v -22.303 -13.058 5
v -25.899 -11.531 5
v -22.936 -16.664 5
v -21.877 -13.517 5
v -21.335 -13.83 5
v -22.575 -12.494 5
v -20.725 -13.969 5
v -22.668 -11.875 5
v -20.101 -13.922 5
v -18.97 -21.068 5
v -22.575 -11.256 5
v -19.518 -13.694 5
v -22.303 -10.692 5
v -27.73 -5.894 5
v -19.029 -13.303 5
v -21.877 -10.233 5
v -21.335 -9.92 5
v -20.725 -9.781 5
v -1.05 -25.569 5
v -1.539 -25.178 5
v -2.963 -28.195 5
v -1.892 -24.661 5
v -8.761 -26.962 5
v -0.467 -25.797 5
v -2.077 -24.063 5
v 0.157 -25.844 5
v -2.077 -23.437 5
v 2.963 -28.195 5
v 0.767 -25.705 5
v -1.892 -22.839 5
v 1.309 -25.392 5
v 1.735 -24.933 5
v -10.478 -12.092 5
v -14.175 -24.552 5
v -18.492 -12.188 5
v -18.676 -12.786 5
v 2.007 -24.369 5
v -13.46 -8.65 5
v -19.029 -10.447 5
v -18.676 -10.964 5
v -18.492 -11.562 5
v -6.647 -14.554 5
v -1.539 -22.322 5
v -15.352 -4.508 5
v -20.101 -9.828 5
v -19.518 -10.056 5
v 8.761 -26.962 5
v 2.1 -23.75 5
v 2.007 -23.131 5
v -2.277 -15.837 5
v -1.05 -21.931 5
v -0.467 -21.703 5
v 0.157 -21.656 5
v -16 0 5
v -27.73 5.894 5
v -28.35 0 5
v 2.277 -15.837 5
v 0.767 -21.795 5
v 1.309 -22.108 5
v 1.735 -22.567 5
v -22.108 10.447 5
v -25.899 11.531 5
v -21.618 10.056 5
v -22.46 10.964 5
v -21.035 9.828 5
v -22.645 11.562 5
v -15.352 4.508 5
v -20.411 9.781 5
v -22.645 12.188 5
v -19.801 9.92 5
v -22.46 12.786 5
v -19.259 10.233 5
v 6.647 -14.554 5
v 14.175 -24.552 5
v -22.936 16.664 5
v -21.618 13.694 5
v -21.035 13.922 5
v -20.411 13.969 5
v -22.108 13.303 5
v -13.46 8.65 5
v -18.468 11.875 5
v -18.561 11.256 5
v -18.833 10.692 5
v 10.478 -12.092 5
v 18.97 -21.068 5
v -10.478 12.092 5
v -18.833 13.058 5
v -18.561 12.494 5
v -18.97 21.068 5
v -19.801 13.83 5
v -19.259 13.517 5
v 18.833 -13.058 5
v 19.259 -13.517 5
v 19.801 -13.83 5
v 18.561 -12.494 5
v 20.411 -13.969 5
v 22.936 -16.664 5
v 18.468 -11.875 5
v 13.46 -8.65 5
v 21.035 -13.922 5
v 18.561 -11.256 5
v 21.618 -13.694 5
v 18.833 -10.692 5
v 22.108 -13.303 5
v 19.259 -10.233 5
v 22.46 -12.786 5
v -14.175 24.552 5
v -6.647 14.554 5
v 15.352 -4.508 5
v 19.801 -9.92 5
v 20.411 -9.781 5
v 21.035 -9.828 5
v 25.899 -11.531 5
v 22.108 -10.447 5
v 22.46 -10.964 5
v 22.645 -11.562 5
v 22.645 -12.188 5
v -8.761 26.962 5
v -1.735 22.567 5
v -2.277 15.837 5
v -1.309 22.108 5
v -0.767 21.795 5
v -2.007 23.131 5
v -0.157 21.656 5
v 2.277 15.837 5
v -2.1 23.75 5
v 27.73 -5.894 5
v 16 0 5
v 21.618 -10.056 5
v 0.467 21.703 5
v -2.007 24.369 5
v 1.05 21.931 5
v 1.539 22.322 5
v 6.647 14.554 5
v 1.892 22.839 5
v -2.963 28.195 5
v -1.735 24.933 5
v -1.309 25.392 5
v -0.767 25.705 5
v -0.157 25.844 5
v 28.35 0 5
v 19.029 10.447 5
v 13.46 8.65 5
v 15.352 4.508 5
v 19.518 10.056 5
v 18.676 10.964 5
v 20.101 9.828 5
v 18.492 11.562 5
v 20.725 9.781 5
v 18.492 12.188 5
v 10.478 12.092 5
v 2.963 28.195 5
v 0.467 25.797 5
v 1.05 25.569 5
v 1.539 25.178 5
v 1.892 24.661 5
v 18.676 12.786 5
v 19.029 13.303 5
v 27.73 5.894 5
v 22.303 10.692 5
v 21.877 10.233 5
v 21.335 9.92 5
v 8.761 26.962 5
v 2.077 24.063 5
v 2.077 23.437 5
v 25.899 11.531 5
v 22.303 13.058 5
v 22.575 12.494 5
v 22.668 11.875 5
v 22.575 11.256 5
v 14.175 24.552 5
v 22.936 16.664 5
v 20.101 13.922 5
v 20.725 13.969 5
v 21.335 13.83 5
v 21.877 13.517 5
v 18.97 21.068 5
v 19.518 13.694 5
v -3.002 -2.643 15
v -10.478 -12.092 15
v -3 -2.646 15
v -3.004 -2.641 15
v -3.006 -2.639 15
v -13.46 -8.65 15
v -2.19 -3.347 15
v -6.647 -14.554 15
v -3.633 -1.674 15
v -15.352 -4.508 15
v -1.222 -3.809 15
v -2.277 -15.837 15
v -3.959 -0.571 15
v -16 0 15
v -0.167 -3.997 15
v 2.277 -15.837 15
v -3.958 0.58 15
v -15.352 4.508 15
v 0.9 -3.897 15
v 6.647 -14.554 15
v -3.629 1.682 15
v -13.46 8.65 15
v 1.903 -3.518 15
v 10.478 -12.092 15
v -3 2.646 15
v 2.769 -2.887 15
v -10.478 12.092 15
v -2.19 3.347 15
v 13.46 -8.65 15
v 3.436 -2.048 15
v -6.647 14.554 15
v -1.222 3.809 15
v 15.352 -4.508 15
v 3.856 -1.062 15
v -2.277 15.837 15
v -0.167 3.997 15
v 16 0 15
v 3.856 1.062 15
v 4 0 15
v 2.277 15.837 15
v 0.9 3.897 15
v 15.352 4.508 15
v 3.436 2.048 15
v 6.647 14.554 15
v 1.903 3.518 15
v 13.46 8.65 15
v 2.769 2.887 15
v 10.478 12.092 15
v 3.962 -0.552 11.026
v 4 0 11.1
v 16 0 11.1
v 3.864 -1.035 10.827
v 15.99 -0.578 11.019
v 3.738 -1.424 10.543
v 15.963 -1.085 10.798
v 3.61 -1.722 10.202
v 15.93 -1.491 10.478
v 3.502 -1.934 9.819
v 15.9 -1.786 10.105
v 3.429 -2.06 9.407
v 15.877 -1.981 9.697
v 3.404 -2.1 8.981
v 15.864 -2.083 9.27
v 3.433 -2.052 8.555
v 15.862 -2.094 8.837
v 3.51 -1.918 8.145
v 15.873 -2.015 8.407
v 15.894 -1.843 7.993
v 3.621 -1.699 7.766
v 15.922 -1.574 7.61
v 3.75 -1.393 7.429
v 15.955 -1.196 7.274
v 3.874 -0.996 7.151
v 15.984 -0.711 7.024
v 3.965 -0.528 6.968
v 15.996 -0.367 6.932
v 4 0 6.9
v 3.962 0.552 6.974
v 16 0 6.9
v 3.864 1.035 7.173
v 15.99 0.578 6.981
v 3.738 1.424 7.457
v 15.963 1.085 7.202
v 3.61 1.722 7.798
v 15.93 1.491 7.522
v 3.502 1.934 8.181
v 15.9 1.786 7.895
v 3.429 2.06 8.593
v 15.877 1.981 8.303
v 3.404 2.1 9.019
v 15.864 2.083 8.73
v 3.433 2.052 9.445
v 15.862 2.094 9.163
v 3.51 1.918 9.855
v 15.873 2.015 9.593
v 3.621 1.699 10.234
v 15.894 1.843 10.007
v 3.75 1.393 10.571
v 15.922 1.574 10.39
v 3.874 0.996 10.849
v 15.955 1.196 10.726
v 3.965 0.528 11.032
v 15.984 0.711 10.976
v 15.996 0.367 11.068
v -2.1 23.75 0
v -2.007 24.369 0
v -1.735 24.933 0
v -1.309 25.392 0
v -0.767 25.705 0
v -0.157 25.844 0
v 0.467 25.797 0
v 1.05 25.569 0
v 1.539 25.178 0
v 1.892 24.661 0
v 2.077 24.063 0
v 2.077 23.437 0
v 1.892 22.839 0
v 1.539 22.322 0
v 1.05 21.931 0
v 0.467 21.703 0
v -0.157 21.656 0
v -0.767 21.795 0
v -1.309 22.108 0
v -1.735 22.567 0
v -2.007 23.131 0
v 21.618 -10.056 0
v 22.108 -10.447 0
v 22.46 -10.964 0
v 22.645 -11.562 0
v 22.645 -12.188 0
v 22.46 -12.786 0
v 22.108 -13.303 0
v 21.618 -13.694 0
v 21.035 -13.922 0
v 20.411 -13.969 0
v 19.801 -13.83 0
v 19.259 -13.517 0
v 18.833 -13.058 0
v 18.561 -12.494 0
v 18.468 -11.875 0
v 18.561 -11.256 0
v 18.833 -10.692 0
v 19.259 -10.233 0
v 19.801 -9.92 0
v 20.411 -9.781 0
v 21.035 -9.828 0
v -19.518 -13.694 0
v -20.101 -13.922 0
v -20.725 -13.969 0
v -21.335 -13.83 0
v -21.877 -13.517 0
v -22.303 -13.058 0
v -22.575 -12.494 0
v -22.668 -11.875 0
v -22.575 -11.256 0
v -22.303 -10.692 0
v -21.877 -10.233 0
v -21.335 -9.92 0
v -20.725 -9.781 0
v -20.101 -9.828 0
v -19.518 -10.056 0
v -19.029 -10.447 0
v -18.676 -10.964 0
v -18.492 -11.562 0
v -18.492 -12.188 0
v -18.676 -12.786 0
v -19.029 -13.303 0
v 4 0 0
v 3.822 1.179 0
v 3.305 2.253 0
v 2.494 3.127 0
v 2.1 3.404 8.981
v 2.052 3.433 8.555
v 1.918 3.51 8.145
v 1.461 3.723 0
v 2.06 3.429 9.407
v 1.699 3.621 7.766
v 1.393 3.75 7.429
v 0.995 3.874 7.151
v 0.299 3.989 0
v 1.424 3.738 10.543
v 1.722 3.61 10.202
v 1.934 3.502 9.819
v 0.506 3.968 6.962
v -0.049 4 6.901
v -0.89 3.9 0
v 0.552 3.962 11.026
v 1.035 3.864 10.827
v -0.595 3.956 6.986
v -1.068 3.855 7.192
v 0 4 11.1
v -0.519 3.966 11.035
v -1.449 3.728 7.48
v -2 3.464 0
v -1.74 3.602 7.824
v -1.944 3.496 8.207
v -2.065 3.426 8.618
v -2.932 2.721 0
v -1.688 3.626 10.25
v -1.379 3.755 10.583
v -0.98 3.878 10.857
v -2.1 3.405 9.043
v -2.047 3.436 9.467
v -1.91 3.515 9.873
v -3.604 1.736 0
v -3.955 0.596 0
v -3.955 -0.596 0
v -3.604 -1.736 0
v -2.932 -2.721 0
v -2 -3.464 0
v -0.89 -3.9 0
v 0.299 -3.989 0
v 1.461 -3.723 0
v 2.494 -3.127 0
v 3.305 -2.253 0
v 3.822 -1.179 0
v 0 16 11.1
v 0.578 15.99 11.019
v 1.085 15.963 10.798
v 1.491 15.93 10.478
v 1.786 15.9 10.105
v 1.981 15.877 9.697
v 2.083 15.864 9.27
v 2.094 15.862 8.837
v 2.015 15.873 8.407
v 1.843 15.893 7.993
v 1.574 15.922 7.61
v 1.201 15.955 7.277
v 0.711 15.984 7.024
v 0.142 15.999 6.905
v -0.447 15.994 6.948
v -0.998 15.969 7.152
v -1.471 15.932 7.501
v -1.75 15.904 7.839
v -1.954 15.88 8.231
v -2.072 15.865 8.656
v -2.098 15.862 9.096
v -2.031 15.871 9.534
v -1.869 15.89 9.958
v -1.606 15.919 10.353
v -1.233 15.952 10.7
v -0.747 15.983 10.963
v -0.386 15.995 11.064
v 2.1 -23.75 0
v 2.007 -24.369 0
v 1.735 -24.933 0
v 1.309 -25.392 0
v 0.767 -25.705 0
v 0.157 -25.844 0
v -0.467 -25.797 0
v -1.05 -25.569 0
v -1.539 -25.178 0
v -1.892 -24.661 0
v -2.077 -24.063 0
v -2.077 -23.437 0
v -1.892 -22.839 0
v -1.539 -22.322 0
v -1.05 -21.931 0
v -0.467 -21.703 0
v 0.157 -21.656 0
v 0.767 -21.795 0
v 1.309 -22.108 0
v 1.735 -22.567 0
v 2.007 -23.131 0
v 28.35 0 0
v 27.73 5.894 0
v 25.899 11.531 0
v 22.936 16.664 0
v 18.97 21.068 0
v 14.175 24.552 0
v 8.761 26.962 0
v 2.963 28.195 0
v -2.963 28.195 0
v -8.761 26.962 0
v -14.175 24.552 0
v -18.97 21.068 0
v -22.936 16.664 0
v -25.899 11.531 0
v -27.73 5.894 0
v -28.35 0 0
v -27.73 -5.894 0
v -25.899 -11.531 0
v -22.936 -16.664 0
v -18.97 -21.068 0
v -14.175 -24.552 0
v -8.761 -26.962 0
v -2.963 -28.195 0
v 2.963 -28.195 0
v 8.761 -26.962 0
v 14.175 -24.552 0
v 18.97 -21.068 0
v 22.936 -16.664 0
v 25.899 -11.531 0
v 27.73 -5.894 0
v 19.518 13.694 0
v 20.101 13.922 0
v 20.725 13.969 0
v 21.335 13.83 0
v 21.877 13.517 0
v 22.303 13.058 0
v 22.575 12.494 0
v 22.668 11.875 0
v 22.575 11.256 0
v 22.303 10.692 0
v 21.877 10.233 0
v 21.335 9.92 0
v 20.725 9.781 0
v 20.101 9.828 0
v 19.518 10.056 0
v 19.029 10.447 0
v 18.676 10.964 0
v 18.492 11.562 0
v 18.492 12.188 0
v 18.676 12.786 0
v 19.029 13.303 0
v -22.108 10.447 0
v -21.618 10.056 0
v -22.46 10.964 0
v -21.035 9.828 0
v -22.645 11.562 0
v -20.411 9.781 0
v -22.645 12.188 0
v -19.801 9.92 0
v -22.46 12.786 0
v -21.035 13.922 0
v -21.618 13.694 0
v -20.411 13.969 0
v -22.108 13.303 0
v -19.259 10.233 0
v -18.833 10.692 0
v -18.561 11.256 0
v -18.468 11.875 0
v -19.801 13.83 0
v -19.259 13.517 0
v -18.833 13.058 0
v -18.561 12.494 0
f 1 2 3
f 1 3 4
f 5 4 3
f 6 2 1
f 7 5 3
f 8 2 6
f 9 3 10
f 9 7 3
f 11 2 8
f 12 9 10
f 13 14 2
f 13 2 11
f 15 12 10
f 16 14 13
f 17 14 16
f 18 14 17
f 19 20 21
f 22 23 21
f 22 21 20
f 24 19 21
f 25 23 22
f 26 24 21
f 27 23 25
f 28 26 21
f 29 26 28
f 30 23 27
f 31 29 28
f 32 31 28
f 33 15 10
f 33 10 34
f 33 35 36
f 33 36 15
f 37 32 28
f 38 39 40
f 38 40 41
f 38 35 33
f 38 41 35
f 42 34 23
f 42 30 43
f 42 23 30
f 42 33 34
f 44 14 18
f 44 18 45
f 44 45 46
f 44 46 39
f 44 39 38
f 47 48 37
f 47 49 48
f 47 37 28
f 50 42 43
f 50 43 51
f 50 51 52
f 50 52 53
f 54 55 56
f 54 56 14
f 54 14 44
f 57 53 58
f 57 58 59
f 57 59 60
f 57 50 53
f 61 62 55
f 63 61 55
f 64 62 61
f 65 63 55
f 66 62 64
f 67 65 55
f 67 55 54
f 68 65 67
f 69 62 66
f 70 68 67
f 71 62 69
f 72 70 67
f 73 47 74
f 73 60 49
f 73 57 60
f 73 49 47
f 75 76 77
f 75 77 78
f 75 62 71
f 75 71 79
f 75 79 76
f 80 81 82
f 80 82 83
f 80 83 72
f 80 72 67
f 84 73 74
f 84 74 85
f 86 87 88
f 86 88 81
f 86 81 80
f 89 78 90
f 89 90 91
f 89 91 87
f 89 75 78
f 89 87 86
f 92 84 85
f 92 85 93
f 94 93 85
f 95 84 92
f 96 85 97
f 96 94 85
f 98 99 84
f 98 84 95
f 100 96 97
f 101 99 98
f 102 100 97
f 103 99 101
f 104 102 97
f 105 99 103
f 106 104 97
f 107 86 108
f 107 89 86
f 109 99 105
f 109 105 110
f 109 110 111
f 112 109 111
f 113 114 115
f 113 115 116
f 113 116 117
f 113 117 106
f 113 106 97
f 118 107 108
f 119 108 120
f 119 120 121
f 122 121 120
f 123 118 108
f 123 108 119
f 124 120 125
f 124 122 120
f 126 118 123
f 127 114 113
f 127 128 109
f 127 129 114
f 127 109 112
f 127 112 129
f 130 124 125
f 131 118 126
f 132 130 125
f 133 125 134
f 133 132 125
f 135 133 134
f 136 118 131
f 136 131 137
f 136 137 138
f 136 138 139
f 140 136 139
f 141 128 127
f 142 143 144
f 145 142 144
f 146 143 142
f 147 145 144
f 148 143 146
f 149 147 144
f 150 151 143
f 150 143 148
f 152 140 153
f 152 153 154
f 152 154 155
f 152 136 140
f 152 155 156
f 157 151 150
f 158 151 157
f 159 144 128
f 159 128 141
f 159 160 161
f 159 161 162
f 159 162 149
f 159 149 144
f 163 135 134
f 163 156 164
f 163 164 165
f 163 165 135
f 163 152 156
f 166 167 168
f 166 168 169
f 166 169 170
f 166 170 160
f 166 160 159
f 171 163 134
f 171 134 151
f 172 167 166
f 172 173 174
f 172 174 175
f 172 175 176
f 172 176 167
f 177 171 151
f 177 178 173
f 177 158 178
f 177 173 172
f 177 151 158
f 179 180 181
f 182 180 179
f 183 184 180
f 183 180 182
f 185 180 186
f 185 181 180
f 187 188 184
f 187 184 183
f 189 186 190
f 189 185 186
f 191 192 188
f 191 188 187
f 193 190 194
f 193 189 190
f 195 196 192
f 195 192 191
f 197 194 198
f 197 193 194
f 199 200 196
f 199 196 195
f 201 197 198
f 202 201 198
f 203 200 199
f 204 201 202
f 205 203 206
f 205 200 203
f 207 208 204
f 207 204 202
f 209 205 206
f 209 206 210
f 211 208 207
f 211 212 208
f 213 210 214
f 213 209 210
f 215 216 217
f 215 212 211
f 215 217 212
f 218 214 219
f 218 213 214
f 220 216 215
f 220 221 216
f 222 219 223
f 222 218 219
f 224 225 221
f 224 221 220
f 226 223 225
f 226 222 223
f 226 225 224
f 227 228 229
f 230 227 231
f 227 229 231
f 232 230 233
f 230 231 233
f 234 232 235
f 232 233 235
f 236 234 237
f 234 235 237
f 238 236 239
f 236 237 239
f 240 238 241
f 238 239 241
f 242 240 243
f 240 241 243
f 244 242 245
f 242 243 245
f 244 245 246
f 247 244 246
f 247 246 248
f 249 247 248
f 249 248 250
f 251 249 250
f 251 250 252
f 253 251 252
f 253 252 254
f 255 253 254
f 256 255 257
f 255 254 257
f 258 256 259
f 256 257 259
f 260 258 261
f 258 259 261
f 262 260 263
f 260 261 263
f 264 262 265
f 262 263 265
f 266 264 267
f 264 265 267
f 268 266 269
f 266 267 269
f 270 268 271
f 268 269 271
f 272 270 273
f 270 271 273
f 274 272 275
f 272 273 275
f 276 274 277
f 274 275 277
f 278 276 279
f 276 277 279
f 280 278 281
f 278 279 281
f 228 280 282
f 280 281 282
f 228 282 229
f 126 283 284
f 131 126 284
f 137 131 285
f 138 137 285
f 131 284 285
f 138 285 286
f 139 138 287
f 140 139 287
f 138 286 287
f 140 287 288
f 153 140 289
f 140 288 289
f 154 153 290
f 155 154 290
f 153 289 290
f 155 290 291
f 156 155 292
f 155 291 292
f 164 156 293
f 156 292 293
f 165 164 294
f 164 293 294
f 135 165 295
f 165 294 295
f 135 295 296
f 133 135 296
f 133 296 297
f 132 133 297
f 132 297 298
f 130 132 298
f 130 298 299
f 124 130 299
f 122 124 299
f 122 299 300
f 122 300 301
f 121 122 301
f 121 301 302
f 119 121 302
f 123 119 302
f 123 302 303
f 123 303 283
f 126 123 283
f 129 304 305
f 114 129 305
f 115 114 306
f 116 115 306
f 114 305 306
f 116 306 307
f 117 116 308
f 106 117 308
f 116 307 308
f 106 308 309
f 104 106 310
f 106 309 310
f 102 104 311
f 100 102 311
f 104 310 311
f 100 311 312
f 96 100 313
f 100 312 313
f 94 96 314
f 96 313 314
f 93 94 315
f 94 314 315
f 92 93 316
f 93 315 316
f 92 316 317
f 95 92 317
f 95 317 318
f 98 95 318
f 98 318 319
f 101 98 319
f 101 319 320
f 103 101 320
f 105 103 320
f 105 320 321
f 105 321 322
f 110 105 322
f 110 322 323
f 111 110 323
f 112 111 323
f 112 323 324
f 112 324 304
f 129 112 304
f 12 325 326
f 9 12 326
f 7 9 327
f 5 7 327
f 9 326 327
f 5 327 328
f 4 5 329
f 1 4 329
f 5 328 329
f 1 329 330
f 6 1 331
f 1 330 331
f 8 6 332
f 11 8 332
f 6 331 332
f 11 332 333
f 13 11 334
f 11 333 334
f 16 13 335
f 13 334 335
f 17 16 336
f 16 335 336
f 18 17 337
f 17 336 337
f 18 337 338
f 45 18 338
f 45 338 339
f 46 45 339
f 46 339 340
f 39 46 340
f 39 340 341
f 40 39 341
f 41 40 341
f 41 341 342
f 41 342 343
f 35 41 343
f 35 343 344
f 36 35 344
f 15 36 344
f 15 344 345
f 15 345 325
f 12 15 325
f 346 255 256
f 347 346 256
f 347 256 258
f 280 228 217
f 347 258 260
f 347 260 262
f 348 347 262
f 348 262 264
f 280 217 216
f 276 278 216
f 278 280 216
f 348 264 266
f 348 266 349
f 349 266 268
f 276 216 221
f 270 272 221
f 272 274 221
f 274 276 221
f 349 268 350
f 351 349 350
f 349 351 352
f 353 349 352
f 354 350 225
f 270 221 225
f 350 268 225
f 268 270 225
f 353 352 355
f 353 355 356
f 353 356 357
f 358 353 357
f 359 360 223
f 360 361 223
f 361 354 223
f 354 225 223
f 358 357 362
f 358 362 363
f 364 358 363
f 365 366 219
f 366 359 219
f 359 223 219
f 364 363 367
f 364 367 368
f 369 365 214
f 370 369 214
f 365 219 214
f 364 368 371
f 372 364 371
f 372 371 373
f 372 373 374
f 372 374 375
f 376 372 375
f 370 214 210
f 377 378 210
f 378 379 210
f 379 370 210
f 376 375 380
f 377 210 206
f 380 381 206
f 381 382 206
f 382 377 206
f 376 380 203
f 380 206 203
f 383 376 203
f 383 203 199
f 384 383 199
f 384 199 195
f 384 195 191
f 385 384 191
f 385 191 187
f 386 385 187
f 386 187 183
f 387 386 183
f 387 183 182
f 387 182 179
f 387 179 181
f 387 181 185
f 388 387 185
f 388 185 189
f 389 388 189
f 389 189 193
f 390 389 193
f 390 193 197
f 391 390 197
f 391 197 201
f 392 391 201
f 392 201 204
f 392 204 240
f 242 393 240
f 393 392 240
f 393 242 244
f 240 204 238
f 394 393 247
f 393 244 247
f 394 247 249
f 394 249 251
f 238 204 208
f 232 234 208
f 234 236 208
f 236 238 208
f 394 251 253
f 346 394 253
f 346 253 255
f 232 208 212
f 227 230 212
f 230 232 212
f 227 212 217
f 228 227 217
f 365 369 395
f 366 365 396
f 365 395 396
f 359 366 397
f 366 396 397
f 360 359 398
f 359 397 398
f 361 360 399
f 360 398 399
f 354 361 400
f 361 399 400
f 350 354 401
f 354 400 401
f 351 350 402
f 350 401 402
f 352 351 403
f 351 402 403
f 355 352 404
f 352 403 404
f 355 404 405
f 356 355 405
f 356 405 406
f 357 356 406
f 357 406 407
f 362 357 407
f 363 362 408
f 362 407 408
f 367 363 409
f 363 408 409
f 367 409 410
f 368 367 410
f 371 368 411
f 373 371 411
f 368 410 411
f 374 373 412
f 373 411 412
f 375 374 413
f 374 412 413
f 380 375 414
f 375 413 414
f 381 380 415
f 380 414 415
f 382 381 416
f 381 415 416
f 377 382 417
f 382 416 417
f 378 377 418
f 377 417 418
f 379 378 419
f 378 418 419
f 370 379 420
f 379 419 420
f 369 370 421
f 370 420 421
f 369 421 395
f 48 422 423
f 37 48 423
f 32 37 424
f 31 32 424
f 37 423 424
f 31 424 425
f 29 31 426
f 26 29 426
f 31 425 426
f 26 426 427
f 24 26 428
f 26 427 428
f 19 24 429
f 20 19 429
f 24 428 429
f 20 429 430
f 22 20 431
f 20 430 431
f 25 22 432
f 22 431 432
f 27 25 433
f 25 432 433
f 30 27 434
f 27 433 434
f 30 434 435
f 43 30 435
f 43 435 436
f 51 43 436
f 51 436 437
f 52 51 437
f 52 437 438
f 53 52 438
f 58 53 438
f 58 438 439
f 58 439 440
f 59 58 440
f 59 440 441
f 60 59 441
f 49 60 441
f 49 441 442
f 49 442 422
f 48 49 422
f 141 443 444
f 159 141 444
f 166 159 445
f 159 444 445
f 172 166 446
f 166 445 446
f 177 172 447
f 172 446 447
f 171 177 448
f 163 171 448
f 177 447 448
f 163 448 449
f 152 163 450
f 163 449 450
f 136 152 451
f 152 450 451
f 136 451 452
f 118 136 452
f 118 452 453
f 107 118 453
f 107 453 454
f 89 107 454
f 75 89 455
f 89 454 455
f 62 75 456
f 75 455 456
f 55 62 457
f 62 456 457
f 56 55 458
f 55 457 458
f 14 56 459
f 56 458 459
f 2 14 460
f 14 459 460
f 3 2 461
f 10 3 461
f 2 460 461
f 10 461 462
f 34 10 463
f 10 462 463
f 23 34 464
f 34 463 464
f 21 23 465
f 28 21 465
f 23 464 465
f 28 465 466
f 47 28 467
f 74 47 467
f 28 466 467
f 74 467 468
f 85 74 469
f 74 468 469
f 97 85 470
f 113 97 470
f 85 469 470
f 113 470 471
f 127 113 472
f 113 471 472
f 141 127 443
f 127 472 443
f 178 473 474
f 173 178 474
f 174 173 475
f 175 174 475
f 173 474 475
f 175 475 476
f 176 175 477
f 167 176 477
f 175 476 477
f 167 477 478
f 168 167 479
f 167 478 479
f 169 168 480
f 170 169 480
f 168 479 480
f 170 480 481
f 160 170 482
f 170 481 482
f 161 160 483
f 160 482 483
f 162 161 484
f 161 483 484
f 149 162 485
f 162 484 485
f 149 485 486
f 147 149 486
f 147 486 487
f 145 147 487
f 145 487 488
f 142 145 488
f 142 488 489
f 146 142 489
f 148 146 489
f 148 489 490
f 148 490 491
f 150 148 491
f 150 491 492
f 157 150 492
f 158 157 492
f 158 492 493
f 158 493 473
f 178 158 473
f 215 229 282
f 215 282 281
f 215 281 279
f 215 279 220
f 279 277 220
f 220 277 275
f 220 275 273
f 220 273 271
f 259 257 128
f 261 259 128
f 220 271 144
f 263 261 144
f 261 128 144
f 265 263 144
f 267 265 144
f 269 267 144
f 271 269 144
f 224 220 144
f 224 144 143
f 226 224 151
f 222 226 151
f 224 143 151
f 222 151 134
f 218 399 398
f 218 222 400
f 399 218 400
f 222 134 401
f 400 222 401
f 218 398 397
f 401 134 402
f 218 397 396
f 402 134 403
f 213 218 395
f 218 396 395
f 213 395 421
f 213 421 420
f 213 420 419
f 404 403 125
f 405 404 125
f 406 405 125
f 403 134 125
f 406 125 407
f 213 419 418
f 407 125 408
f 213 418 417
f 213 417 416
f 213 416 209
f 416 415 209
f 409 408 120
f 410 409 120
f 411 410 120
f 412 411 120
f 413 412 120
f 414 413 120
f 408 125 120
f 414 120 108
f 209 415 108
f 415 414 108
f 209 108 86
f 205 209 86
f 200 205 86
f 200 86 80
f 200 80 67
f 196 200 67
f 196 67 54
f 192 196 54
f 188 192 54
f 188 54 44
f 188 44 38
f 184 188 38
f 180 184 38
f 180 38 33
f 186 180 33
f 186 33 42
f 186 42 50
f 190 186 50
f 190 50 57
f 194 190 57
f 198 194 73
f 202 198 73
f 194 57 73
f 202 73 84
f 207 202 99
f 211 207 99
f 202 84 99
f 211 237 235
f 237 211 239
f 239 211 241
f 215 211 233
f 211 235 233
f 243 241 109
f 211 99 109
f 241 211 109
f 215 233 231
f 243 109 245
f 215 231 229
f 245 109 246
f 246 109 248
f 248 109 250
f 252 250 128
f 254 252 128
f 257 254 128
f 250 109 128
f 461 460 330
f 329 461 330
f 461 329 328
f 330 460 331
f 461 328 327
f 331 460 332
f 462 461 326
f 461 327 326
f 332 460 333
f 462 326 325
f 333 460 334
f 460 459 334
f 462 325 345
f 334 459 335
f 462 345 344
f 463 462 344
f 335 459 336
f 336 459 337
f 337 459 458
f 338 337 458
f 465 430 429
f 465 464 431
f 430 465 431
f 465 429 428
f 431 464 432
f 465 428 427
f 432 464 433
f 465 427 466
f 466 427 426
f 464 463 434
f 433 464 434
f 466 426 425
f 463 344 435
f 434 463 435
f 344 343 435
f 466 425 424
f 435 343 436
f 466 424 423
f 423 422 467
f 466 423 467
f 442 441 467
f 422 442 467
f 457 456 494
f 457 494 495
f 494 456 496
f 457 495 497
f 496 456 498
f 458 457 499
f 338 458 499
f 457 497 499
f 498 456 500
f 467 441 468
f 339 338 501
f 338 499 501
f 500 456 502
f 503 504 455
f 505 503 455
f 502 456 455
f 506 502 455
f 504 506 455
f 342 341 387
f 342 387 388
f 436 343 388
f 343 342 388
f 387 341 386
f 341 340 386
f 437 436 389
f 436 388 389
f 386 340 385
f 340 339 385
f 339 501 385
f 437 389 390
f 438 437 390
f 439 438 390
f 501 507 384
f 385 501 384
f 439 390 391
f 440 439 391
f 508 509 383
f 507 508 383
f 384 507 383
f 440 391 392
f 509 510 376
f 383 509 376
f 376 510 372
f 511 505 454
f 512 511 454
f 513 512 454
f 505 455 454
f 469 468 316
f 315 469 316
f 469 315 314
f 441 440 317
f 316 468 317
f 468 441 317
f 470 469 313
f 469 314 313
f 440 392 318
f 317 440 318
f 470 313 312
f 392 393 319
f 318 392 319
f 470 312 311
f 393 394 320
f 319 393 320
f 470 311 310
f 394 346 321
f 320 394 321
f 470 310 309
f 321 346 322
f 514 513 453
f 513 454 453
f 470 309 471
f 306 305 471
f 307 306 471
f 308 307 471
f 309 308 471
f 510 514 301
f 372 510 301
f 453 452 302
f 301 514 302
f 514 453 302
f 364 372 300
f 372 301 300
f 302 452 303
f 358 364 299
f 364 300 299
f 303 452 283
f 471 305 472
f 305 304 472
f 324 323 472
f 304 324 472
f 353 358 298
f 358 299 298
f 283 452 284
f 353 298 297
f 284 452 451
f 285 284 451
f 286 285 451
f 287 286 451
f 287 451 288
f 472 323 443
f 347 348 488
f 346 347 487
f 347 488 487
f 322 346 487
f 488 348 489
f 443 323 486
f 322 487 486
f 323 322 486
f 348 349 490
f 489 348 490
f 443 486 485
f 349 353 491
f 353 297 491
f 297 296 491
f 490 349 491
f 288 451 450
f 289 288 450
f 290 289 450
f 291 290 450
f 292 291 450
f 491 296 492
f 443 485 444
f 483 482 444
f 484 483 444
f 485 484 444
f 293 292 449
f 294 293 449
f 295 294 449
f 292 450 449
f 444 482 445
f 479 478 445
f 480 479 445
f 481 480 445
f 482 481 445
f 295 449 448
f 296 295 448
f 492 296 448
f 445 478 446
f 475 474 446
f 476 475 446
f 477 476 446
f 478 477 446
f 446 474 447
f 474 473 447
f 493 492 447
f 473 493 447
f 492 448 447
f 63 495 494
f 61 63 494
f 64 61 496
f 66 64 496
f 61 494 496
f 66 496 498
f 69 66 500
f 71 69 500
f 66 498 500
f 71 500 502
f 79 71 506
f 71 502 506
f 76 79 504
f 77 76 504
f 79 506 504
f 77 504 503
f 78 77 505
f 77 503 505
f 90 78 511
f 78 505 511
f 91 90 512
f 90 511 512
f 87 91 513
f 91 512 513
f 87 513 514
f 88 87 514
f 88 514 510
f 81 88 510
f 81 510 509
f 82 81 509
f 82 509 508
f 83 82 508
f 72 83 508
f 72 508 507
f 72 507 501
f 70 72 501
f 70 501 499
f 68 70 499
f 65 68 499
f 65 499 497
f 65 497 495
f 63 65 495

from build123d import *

# Parameters (mm, degrees)
SKETCH_1_R               = 28.35
EXTRUDE_1_DEPTH          = 5
SKETCH_2_R               = 16
EXTRUDE_2_DEPTH          = 10
SKETCH_3_R               = 4
CUT_EXTRUDE_1_DEPTH      = 43.807067174
M5X0_8_1_D               = 4.2
PATTERN_CIRCULAR_1_COUNT = 6
SKETCH_11_W              = 2.1
SKETCH_11_H              = 16.001
PATTERN_CIRCULAR_2_COUNT = 2
PATTERN_CIRCULAR_2_ANGLE = 90
BOSS_EXTRUDE1_DEPTH      = 15


with BuildPart() as part:
    # 草圖1 → 填料-伸長1 (new body)
    with BuildSketch(Plane.XY):
        Circle(SKETCH_1_R)
    extrude(amount=EXTRUDE_1_DEPTH)

    # 草圖2 → 填料-伸長2 (add)
    with BuildSketch(Plane.XY.offset(5)):
        Circle(SKETCH_2_R)
    extrude(amount=EXTRUDE_2_DEPTH)

    # 草圖3 → 除料-伸長1 (cut, through all)
    with BuildSketch(Plane.XY.offset(15)):
        Circle(SKETCH_3_R)
    extrude(amount=-CUT_EXTRUDE_1_DEPTH, mode=Mode.SUBTRACT)

    # M5x0.8 螺紋孔1 (through all)
    with Locations(Plane(origin=(0, 23.75, 5), x_dir=(1, 0, 0), z_dir=(0, 0, 1))):
        with Locations((0, 0)):
            m5x0_8_1 = Hole(M5X0_8_1_D / 2)

    # 環狀複製排列1: M5x0.8 螺紋孔1 ×6 about axis
    pattern_circular_1_axis = Axis((0, 0, 0), (0, 0, 1))
    for i in range(1, PATTERN_CIRCULAR_1_COUNT):
        add(m5x0_8_1.rotate(pattern_circular_1_axis, i * 360 / PATTERN_CIRCULAR_1_COUNT), mode=Mode.SUBTRACT)

    # 草圖11 → M5x0.8 螺紋孔2 (revolve, cut)
    with BuildSketch(Plane(origin=(0, 0, 9), x_dir=(0, 0, 1), z_dir=(0, 1, 0))):
        with Locations((1.05, 8.0005)):
            Rectangle(SKETCH_11_W, SKETCH_11_H)
    m5x0_8_2 = revolve(axis=Axis((-6.35, 0, 9), (1, 0, 0)), mode=Mode.SUBTRACT)

    # 環狀複製排列2: M5x0.8 螺紋孔2 ×2 about axis
    pattern_circular_2_axis = Axis((0, 0, 15), (0, 0, 1))
    for i in range(1, PATTERN_CIRCULAR_2_COUNT):
        add(m5x0_8_2.rotate(pattern_circular_2_axis, i * PATTERN_CIRCULAR_2_ANGLE / (PATTERN_CIRCULAR_2_COUNT - 1)), mode=Mode.SUBTRACT)

    # Sketch1 → Boss-Extrude1 (add)
    with BuildSketch(Plane.XY.offset(15)):
        with BuildLine():
            ThreePointArc((4, 0), (1.414213562, 3.741657387), (-3, 2.645751311))
            Line((-3, 2.645751311), (-3, -2.645751311))
            ThreePointArc((-3, -2.645751311), (1.414213562, -3.741657387), (4, 0))
        make_face()
        with BuildLine():
            Line((-3, -2.645751311), (-3, 2.645751311))
            ThreePointArc((-3, 2.645751311), (-3.999997422, 0.0045417), (-3.006000366, -2.638931943))
            ThreePointArc((-3.006000366, -2.638931943), (-3.003002119, -2.64234333), (-3, -2.645751311))
        make_face()
    extrude(amount=BOSS_EXTRUDE1_DEPTH)


with BuildPart() as boss_extrude1_kept_piece:
    # of the separate pieces the step leaves, the one the design keeps (boss_extrude1_pieces_kept)
    add(part.part.solids().sort_by_distance((28.35, 0, 0))[0])


solid = boss_extrude1_kept_piece.part
